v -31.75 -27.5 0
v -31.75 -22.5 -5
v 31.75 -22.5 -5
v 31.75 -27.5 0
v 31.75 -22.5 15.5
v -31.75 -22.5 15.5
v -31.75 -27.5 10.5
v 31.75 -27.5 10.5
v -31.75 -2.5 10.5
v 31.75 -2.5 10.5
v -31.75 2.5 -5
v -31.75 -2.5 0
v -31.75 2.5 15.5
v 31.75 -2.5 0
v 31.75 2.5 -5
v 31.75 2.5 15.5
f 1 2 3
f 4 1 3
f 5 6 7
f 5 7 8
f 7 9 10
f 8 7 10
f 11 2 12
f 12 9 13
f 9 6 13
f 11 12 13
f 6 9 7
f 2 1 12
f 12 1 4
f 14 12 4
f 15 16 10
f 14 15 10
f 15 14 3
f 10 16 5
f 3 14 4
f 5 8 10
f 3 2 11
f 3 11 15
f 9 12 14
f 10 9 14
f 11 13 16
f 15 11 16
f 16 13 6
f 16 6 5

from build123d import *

# Parameters (mm, degrees)
F0_W     = 63.5
F0_H     = 5
F1_DEPTH = 10.5
F2_W     = 63.5
F2_H     = 25
F2_H_2   = 5
F3_DEPTH = 5
F4_SIZE  = 4.99999
F5_W     = 63.5
F5_H     = 5
F5_H_2   = 25
F6_DEPTH = 5
F7_SIZE  = 4.99999


# Not quite as in the source:
# - a fillet or chamfer is up to 0.001 mm smaller than in the source, because OpenCascade refuses the exact size


with BuildPart() as f1:
    # F0 (on Top) → F1 (new body)
    with BuildSketch(Plane.XY):
        Rectangle(F0_W, F0_H)
    extrude(amount=F1_DEPTH)

    # F2 (on face) → F3 (join)
    with BuildSketch(Plane.XY.offset(10.5)):
        with Locations((0, -15)):
            Rectangle(F2_W, F2_H)
        Rectangle(F2_W, F2_H_2)
    extrude(amount=F3_DEPTH)

    # F4 (size 5 in the source; OpenCascade refuses exactly that, so slightly less here)
    f4_edges = [f1.edges().sort_by_distance(p)[0] for p in [
        (0, -27.5, 15.5),
    ]]
    chamfer(f4_edges, length=F4_SIZE)

    # F5 (on face) → F6 (join)
    with BuildSketch(Plane(origin=(0, 0, 0), x_dir=(1, 0, 0), z_dir=(0, 0, -1))):
        Rectangle(F5_W, F5_H)
        with Locations((0, 15)):
            Rectangle(F5_W, F5_H_2)
    extrude(amount=F6_DEPTH)

    # F7 (size 5 in the source; OpenCascade refuses exactly that, so slightly less here)
    f7_edges = [f1.edges().sort_by_distance(p)[0] for p in [
        (0, -27.5, -5),
    ]]
    chamfer(f7_edges, length=F7_SIZE)


solid = f1.part
